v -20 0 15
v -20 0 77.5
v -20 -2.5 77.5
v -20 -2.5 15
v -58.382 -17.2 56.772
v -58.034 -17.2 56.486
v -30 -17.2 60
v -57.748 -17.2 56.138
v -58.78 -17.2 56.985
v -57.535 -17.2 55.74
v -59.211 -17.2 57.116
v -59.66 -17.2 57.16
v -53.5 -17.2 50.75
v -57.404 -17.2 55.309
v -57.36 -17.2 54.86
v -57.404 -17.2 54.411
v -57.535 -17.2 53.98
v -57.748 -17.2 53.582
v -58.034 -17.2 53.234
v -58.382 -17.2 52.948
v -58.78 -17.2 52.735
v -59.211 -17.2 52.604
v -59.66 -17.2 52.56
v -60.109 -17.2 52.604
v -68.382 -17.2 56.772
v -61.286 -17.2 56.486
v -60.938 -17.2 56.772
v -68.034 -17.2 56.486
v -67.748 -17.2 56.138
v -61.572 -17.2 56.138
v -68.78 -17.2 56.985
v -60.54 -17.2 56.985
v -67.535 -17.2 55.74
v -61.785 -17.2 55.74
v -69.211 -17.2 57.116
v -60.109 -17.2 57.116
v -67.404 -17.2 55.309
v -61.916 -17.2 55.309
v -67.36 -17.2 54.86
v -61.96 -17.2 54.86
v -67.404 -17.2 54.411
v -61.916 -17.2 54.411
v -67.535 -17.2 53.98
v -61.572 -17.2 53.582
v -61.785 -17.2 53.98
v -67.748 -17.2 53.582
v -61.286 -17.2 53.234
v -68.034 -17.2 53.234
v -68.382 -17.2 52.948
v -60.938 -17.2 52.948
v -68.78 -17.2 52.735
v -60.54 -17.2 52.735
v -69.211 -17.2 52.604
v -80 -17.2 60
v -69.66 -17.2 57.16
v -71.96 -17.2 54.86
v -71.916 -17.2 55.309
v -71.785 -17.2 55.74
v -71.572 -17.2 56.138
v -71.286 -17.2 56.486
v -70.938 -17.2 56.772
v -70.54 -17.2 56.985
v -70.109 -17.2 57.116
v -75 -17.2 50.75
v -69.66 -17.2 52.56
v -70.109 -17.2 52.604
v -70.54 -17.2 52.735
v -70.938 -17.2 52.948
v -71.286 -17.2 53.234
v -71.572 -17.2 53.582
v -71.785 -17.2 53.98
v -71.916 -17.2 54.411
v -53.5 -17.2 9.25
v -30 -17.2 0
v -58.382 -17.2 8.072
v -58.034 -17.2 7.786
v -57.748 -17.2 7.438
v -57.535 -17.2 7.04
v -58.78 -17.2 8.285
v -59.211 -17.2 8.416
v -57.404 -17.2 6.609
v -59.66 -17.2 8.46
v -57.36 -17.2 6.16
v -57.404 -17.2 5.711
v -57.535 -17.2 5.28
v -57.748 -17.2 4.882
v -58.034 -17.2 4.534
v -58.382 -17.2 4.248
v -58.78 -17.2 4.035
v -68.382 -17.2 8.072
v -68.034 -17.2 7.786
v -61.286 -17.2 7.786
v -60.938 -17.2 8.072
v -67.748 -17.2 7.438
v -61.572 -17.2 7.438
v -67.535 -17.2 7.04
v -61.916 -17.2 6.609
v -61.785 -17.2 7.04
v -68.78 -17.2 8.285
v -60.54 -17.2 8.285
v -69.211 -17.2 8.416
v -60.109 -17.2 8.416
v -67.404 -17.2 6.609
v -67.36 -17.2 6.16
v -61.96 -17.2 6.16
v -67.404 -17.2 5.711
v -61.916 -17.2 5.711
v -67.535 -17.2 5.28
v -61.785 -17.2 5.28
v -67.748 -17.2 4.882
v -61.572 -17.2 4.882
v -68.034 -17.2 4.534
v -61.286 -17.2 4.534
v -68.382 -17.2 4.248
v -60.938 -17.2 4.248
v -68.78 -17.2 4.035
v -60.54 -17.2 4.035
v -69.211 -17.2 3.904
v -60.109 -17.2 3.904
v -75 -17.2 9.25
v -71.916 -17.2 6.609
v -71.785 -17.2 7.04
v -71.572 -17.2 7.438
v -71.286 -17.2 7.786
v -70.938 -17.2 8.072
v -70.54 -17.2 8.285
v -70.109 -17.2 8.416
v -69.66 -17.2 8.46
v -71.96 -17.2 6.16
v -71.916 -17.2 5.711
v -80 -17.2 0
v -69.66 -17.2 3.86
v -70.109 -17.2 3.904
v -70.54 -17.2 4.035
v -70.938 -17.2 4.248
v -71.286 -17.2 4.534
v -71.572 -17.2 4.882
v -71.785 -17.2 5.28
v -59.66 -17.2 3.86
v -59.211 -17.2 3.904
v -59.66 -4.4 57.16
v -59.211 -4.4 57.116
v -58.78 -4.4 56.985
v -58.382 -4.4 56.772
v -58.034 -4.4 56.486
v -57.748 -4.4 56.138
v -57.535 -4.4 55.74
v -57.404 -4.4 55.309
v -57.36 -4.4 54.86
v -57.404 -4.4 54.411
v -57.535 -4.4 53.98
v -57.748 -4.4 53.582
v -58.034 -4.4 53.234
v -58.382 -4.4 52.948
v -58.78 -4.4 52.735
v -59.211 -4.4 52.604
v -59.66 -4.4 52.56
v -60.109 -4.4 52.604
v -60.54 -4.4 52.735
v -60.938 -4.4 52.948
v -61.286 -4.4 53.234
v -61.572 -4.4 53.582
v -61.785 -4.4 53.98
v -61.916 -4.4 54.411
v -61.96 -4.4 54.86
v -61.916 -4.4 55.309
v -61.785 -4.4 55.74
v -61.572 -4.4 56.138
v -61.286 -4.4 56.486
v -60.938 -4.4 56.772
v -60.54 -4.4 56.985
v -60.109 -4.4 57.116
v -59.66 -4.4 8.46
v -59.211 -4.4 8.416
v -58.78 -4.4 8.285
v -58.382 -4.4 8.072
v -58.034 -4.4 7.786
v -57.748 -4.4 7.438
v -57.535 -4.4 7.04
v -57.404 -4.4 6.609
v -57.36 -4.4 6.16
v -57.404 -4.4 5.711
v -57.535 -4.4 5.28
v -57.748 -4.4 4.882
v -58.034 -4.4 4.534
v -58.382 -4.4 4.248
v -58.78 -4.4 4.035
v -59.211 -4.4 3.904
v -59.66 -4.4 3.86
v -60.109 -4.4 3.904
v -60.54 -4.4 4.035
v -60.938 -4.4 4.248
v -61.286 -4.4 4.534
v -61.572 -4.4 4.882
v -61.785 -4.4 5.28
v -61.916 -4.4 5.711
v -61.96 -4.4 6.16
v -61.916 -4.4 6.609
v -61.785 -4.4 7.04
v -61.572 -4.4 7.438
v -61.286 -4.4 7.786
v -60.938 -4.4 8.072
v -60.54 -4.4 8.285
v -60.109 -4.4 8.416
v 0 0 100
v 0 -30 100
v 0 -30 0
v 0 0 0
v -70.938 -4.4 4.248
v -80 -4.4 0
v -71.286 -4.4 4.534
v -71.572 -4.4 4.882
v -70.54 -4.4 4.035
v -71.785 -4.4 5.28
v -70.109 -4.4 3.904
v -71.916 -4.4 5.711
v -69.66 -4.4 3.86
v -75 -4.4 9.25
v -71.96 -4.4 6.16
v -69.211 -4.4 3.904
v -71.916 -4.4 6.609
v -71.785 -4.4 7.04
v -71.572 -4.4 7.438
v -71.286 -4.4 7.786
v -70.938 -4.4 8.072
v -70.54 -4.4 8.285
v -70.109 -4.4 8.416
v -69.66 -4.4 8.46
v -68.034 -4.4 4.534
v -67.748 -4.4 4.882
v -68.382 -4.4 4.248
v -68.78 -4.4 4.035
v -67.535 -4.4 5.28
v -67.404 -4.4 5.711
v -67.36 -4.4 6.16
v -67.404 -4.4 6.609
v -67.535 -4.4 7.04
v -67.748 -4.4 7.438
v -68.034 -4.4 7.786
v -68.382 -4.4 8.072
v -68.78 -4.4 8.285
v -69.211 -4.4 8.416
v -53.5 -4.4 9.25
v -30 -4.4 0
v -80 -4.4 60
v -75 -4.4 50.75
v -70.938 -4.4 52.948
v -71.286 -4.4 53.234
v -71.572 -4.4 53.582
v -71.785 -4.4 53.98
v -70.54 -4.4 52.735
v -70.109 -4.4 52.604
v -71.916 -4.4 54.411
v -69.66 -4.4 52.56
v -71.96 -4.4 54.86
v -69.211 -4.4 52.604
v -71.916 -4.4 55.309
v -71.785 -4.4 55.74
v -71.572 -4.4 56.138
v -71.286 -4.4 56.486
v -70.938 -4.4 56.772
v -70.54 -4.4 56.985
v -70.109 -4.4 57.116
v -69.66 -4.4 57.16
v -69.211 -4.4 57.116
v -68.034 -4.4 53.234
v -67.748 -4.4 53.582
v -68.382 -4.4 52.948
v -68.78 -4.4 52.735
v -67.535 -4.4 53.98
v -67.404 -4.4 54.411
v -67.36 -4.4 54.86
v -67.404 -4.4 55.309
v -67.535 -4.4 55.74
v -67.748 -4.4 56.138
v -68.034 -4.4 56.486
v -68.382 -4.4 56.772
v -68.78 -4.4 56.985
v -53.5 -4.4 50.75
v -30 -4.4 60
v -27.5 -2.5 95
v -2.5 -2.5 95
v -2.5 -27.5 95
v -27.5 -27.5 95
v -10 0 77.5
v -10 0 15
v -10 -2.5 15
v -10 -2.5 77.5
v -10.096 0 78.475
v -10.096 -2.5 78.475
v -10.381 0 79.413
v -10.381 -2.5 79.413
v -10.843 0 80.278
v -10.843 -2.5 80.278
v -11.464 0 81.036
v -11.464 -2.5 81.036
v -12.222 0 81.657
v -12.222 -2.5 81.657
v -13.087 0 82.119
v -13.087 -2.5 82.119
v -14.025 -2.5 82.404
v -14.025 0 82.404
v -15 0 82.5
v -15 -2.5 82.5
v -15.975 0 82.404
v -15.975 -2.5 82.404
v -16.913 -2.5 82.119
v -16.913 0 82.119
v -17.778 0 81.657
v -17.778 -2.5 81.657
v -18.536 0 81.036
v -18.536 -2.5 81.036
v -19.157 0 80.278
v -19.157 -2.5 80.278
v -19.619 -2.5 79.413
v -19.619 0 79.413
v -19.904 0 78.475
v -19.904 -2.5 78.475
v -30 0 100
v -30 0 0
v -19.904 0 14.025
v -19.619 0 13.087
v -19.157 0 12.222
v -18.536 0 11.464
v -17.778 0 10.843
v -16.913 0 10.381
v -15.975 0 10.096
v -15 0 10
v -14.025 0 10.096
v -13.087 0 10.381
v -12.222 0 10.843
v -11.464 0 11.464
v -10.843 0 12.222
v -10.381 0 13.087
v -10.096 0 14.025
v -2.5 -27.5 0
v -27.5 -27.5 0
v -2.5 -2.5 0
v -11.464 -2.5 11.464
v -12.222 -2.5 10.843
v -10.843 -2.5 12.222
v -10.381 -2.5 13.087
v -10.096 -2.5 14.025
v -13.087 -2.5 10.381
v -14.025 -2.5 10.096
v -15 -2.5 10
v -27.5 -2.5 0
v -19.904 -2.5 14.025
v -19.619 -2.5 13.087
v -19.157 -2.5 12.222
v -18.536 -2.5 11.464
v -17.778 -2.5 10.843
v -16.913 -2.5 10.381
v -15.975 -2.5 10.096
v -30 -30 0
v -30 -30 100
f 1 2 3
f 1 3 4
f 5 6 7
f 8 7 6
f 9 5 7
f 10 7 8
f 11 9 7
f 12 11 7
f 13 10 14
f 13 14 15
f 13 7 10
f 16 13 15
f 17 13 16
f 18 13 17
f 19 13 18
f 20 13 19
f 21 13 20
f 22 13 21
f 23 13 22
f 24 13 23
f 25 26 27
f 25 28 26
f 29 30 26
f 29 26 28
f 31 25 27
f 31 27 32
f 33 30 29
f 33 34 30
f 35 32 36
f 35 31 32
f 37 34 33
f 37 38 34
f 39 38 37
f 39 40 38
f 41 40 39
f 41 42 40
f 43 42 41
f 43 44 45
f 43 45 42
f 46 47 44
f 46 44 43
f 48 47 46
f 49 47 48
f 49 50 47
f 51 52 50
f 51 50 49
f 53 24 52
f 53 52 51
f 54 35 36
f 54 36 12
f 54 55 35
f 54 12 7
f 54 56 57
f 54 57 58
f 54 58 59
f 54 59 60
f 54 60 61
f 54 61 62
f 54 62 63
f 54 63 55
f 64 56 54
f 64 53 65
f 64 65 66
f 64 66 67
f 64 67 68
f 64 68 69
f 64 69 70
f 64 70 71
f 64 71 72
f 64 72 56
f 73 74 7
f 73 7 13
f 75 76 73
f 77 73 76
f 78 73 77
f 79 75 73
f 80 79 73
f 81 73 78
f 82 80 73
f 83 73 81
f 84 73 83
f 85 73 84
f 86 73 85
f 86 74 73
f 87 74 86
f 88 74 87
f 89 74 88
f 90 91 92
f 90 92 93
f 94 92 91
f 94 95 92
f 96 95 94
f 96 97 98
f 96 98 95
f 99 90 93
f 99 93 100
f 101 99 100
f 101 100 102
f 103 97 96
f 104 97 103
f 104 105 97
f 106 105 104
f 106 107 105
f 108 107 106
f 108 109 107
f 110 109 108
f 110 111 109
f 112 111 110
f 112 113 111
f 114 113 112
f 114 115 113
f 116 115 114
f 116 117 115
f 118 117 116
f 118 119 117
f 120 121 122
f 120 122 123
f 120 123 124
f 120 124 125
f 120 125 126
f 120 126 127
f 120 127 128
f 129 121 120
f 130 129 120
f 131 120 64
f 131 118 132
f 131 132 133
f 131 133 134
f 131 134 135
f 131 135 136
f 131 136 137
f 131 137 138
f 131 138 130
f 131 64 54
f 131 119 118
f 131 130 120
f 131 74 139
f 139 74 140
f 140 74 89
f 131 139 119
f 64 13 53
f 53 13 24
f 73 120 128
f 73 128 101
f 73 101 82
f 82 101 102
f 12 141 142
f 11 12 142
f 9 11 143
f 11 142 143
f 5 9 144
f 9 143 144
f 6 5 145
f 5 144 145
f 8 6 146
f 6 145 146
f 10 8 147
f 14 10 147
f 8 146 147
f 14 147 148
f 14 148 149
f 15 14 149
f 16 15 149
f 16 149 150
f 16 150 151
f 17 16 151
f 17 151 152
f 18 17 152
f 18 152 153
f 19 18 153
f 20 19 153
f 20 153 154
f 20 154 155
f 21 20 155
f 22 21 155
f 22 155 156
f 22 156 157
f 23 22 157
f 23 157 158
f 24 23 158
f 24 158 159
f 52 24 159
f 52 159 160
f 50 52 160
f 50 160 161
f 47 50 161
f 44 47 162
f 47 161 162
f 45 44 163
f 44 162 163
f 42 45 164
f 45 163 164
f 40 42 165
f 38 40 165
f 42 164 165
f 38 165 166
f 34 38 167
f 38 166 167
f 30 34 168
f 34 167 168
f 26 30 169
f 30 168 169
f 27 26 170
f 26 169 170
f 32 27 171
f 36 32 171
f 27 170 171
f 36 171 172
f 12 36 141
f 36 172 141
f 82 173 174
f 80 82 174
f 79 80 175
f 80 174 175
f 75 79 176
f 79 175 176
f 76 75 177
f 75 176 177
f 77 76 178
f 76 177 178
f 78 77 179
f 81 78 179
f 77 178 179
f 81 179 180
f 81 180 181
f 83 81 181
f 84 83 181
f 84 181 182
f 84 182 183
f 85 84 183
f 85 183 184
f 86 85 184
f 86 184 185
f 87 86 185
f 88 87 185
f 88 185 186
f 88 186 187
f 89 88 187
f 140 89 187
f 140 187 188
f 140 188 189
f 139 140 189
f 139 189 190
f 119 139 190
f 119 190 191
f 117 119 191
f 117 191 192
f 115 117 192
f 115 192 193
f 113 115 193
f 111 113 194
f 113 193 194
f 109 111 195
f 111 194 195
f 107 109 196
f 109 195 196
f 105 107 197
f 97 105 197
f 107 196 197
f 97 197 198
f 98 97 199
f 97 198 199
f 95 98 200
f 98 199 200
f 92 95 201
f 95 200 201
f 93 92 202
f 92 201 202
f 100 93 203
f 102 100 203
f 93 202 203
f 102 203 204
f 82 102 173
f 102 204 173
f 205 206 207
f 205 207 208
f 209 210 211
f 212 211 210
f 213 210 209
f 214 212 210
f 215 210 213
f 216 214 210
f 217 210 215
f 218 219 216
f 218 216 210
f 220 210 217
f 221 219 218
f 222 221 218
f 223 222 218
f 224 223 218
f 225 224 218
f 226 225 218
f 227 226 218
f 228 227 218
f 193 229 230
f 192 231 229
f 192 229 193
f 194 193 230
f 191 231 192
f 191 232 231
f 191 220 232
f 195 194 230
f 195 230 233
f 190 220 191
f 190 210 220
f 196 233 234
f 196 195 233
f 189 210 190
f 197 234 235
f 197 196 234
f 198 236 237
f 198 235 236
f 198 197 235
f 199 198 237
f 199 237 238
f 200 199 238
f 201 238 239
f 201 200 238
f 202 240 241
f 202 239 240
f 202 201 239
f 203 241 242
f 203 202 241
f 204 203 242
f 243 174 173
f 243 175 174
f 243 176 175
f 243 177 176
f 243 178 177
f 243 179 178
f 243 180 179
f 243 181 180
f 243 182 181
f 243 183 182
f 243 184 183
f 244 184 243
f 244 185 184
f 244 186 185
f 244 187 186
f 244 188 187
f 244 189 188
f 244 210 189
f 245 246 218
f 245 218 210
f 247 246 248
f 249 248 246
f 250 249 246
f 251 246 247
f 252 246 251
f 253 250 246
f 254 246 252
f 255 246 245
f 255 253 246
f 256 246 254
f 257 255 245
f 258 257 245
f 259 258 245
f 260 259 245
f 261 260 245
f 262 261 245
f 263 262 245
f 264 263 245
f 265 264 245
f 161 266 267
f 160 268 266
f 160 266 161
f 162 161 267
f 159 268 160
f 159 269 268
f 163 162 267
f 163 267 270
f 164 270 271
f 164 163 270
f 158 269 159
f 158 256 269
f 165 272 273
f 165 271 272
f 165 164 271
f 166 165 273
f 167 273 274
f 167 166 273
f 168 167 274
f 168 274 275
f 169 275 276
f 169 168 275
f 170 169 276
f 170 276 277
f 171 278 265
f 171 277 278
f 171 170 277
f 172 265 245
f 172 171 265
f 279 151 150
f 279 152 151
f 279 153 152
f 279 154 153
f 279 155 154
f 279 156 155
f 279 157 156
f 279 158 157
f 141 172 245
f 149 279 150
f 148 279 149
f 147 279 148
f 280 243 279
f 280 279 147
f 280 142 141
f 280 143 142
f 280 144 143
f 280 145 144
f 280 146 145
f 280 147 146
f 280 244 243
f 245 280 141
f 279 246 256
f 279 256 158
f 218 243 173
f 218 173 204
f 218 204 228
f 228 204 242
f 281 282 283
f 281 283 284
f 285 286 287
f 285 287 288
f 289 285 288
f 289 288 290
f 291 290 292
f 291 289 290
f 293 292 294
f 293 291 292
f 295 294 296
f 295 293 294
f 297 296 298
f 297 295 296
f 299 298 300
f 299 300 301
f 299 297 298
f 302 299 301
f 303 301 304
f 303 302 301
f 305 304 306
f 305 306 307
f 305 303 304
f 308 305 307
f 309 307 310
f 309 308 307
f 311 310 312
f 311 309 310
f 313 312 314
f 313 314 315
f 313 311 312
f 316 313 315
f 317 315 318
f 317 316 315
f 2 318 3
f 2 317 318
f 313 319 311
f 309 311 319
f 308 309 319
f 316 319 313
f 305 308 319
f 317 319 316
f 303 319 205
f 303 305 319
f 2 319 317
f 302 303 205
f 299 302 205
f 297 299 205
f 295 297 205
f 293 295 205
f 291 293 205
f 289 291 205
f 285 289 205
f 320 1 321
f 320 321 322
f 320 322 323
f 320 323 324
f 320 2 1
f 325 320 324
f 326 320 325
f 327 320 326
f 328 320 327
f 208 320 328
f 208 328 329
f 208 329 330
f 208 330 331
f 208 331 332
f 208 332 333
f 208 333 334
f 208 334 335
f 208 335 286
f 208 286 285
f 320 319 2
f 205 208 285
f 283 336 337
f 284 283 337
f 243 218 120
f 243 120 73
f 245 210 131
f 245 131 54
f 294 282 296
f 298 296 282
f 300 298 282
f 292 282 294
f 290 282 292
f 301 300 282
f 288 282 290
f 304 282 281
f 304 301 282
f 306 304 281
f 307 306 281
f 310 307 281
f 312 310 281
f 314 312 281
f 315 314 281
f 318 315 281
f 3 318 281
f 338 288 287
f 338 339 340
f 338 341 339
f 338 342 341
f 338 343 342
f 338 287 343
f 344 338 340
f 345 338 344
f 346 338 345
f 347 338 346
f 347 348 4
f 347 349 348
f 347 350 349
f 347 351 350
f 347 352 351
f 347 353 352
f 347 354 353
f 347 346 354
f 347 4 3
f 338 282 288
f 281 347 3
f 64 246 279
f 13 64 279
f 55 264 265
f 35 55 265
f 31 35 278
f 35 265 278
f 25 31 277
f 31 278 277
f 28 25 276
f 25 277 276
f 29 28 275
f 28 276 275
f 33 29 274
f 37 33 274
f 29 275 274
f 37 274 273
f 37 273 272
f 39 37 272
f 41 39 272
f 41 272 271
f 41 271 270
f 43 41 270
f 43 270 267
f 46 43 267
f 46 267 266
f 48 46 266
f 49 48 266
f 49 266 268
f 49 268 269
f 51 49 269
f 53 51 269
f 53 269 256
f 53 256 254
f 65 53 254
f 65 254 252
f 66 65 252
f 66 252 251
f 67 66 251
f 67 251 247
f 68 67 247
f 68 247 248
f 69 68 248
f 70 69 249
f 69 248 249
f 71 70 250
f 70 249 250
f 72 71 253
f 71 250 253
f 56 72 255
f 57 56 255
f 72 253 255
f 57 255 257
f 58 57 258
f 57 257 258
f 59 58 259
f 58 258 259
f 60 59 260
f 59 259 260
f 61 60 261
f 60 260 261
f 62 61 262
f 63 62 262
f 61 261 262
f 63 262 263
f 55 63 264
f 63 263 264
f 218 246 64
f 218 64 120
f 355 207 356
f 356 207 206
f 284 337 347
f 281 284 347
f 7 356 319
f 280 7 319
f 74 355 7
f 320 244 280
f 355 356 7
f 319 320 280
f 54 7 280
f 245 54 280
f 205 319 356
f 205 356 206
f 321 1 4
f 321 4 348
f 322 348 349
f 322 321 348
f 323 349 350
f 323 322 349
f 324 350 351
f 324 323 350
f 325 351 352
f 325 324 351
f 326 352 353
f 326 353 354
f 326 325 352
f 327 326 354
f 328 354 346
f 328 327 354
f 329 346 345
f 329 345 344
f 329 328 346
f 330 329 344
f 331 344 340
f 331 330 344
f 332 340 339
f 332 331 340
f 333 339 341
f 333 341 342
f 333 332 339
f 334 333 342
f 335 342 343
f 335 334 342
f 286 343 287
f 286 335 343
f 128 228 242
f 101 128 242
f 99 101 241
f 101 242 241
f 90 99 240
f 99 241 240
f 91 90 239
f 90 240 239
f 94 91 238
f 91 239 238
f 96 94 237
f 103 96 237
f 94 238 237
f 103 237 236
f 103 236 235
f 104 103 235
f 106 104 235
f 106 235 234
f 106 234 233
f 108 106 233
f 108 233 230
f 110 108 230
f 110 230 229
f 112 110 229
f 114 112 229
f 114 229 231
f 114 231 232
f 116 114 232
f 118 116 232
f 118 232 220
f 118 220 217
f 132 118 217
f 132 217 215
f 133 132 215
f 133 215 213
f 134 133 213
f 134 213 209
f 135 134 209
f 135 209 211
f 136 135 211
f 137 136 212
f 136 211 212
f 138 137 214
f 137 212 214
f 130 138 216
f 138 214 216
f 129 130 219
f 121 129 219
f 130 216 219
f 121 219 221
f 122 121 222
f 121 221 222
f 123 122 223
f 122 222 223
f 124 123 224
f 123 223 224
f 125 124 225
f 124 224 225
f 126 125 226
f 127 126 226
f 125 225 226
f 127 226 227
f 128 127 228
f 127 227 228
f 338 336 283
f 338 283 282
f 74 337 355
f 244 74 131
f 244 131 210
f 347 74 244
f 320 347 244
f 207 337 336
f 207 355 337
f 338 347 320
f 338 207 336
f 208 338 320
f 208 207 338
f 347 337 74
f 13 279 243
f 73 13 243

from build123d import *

# Parameters (mm, degrees)
ESQUISSE1_W             = 30
ESQUISSE1_H             = 30
BOSS_EXTRU_1_DEPTH      = 100
ESQUISSE2_W             = 25
ESQUISSE2_H             = 25
ENL_V_MAT_EXTRU_1_DEPTH = 95
ENL_V_MAT_EXTRU_2_DEPTH = 2.5
ESQUISSE4_W             = 60
ESQUISSE4_H             = 25.6
BOSS_EXTRU_2_DEPTH      = 50
ESQUISSE5_W             = 21.5
ESQUISSE5_H             = 41.5
ENL_V_MAT_EXTRU_3_DEPTH = 132.52946438
ESQUISSE6_R             = 2.3
ENL_V_MAT_EXTRU_4_DEPTH = 132.52946438
ESQUISSE9_W             = 50
ESQUISSE9_H             = 12.8
ENL_V_MAT_EXTRU_6_DEPTH = 132.52946438


with BuildPart() as part:
    # Esquisse1 → Boss.-Extru.1 (new body)
    with BuildSketch(Plane.XY):
        with Locations((-15, -15)):
            Rectangle(ESQUISSE1_W, ESQUISSE1_H)
    extrude(amount=BOSS_EXTRU_1_DEPTH)

    # Esquisse2 → Enlèv. mat.-Extru.1 (cut)
    with BuildSketch(Plane(origin=(0, 0, 0), x_dir=(-1, 0, 0), z_dir=(0, 0, -1))):
        with Locations((15, -15)):
            Rectangle(ESQUISSE2_W, ESQUISSE2_H)
    extrude(amount=-ENL_V_MAT_EXTRU_1_DEPTH, mode=Mode.SUBTRACT)

    # Esquisse3 → Enlèv. mat.-Extru.2 (cut)
    with BuildSketch(Plane(origin=(0, 0, 0), x_dir=(1, 0, 0), z_dir=(0, 1, 0))):
        with BuildLine():
            Line((-10, -15), (-10, -77.5))
            ThreePointArc((-10, -77.5), (-15, -82.5), (-20, -77.5))
            Line((-20, -77.5), (-20, -15))
            ThreePointArc((-20, -15), (-15, -10), (-10, -15))
        make_face()
    extrude(amount=-ENL_V_MAT_EXTRU_2_DEPTH, mode=Mode.SUBTRACT)

    # Esquisse4 → Boss.-Extru.2 (add)
    with BuildSketch(Plane.ZY.offset(30)):
        with Locations((30, -17.2)):
            Rectangle(ESQUISSE4_W, ESQUISSE4_H)
    extrude(amount=BOSS_EXTRU_2_DEPTH)

    # Esquisse5 → Enlèv. mat.-Extru.3 (cut, through all)
    with BuildSketch(Plane(origin=(0, 0, 0), x_dir=(1, 0, 0), z_dir=(0, 1, 0))):
        with Locations((-64.25, -30)):
            Rectangle(ESQUISSE5_W, ESQUISSE5_H)
    extrude(amount=-ENL_V_MAT_EXTRU_3_DEPTH, mode=Mode.SUBTRACT)

    # Esquisse6 → Enlèv. mat.-Extru.4 (cut, through all)
    with BuildSketch(Plane(origin=(0, 0, 0), x_dir=(1, 0, 0), z_dir=(0, 1, 0))):
        with Locations(Location((-69.66, -54.86, 0), (0, 0, 270))):
            Circle(ESQUISSE6_R)
        with Locations(Location((-59.66, -54.86, 0), (0, 0, 270))):
            Circle(ESQUISSE6_R)
        with Locations(Location((-69.66, -6.16, 0), (0, 0, 270))):
            Circle(ESQUISSE6_R)
        with Locations(Location((-59.66, -6.16, 0), (0, 0, 270))):
            Circle(ESQUISSE6_R)
    extrude(amount=-ENL_V_MAT_EXTRU_4_DEPTH, mode=Mode.SUBTRACT)

    # Esquisse9 → Enlèv. mat.-Extru.6 (cut, through all)
    with BuildSketch(Plane(origin=(0, 0, 0), x_dir=(-1, 0, 0), z_dir=(0, 0, -1))):
        with Locations((55, -23.6)):
            Rectangle(ESQUISSE9_W, ESQUISSE9_H)
    extrude(amount=-ENL_V_MAT_EXTRU_6_DEPTH, mode=Mode.SUBTRACT)


solid = part.part
